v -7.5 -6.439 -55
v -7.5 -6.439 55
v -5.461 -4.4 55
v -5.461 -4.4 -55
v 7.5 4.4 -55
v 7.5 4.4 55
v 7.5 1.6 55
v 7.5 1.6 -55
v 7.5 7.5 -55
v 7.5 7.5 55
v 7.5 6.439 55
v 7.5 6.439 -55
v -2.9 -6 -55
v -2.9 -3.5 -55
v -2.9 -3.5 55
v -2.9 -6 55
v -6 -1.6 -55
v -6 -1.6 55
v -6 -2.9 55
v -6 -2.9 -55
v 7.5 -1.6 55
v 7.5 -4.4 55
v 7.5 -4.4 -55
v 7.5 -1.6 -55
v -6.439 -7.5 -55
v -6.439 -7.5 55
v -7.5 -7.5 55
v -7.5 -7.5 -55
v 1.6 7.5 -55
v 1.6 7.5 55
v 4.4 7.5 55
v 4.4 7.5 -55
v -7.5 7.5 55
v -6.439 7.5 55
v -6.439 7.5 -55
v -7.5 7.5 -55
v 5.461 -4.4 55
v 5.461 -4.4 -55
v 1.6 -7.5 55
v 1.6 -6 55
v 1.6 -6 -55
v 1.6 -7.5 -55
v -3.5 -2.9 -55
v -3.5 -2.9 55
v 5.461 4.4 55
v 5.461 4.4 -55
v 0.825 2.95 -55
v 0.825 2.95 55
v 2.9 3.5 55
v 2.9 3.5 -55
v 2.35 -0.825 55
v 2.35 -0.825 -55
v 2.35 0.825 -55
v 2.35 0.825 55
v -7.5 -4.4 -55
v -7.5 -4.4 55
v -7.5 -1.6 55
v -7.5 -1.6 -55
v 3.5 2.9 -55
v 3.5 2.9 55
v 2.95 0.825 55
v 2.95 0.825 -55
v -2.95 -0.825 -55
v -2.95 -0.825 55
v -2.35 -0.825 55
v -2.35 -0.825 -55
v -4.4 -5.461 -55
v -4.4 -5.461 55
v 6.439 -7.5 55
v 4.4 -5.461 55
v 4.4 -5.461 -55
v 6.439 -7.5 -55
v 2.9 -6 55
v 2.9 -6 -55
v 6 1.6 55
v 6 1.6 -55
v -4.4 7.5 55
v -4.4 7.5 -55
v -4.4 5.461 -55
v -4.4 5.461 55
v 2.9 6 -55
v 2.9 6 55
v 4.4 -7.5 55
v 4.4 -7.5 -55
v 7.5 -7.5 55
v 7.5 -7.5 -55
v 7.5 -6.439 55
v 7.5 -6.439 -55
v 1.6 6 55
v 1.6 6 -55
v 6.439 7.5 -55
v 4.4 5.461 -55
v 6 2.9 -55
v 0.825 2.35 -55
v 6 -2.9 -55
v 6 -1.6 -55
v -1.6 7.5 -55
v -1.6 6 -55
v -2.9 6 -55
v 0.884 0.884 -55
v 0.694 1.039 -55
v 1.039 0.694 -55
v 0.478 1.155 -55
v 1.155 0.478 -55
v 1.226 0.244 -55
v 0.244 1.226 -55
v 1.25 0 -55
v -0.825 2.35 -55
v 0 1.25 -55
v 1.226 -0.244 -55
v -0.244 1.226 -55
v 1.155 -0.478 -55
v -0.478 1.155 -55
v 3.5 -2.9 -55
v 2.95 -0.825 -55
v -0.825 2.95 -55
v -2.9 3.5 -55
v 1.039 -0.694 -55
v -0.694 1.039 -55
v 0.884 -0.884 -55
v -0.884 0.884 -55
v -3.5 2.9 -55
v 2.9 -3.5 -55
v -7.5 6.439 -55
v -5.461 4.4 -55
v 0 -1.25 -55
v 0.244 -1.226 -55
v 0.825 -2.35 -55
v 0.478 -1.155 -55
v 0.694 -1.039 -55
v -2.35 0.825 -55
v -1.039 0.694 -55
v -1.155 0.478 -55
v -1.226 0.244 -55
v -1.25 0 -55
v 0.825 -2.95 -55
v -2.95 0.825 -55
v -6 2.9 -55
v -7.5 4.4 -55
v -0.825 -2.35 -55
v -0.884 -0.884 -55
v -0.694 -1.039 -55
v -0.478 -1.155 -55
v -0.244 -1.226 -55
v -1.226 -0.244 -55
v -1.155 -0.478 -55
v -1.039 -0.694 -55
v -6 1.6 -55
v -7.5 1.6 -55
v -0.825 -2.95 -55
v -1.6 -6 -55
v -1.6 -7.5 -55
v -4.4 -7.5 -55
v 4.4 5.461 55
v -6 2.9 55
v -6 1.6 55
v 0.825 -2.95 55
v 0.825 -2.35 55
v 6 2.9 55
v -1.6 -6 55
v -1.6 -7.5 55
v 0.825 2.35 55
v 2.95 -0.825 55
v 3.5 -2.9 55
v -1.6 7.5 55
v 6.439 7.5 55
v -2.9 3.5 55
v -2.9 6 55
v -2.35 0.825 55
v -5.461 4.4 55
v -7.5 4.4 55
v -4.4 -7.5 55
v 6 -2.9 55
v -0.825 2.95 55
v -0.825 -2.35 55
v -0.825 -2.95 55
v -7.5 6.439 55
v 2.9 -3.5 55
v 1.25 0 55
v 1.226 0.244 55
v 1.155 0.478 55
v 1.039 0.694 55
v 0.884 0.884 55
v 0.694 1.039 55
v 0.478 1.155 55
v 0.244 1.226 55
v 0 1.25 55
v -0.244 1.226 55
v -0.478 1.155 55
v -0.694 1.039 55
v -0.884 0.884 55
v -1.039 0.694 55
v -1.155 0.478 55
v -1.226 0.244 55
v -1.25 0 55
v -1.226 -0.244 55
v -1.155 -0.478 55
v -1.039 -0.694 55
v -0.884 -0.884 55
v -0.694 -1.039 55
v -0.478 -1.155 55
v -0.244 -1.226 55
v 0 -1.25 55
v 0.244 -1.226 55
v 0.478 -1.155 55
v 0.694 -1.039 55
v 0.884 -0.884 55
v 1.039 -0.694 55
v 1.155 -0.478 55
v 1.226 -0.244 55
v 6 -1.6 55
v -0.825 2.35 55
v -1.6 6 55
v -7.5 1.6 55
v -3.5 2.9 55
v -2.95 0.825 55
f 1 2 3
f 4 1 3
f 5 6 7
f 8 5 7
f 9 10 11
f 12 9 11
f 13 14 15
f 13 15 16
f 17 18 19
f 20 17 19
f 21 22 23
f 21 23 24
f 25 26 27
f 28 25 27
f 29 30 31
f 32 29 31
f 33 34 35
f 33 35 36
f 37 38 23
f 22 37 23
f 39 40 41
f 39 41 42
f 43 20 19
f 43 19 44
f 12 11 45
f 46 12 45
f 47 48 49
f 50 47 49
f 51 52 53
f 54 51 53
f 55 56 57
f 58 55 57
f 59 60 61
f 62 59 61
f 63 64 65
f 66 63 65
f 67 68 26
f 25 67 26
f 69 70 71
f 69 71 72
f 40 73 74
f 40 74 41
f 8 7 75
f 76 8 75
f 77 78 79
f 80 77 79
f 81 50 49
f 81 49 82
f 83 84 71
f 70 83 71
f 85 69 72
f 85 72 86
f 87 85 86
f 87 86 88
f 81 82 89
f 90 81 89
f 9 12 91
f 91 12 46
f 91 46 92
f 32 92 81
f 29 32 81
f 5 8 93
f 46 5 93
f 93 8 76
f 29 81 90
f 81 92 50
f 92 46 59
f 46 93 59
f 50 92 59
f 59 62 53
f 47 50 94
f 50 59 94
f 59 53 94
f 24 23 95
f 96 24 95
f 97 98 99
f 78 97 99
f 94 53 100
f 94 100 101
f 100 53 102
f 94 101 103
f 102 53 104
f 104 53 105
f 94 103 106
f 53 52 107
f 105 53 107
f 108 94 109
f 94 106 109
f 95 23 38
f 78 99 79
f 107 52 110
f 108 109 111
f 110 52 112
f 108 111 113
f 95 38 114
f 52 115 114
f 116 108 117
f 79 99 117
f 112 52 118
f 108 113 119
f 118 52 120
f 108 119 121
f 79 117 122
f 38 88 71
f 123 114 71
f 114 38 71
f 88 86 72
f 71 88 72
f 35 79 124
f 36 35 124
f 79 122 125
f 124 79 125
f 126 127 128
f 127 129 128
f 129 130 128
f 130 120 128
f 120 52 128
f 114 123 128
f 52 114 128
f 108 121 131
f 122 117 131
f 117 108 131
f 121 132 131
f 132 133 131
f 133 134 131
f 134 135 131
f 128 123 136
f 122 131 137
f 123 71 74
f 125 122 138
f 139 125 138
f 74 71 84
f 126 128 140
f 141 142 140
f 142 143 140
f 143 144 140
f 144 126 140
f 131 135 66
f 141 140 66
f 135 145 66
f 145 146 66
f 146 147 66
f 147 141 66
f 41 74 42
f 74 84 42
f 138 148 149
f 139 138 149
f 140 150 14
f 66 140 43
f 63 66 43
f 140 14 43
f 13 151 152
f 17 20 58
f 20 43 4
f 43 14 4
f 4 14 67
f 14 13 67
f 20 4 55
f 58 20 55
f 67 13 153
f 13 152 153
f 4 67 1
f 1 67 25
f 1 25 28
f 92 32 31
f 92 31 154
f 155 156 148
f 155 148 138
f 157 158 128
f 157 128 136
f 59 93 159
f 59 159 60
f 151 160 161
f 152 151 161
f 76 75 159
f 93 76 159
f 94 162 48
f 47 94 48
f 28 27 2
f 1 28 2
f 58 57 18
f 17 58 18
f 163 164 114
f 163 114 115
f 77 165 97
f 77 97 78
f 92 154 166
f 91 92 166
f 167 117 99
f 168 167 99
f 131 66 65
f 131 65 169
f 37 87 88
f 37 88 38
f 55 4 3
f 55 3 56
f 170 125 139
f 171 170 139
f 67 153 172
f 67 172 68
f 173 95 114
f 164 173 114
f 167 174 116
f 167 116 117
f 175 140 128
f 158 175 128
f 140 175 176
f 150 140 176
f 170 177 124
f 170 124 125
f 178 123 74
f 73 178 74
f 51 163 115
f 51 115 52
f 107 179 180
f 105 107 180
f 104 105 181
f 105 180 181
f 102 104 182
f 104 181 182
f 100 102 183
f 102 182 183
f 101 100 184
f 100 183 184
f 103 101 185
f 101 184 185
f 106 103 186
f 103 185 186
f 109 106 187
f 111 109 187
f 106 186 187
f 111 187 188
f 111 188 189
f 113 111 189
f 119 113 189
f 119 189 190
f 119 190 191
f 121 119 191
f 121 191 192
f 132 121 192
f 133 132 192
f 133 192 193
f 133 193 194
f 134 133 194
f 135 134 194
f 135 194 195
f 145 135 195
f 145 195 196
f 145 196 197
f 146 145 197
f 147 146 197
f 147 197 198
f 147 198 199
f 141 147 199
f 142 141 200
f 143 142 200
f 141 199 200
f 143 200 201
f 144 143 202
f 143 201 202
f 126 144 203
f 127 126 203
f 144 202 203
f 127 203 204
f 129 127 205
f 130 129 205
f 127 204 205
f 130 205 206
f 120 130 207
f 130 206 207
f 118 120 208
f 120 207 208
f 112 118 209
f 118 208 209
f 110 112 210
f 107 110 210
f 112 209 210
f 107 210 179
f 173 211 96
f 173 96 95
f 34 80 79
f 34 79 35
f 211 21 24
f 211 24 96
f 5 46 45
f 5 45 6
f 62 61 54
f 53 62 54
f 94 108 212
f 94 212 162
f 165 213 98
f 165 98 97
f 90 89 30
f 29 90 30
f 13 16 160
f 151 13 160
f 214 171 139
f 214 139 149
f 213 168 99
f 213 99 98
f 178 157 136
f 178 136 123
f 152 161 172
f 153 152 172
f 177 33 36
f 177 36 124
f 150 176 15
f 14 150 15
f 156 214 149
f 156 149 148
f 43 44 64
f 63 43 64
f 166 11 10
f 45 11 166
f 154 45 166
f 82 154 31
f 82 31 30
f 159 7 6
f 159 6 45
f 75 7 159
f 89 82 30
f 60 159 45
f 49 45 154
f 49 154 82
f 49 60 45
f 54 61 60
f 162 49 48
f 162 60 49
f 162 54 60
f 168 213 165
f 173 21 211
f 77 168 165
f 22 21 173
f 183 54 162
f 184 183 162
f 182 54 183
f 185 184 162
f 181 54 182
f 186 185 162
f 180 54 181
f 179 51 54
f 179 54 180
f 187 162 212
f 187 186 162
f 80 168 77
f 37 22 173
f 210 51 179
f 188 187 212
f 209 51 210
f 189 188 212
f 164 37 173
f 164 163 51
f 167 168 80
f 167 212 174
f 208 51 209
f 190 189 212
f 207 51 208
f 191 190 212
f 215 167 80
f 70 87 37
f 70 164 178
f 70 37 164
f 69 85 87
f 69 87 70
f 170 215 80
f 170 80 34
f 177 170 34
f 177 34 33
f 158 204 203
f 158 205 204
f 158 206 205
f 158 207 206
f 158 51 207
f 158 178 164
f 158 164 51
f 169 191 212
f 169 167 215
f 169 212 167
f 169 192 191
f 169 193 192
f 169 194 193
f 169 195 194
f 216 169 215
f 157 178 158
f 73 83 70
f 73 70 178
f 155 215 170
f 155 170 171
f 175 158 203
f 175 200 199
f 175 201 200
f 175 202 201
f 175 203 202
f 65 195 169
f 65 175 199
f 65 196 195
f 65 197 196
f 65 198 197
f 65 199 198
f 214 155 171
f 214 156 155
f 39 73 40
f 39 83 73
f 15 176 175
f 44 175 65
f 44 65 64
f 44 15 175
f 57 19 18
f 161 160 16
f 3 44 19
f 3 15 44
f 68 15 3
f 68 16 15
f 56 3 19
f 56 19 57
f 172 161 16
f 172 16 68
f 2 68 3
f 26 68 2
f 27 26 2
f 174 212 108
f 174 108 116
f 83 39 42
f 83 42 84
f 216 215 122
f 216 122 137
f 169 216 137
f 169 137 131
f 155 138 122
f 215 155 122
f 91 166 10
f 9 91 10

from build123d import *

# Parameters (mm, degrees)
RESSALTO_EXTRUS_O1_DEPTH   = 55
ESPELHAR2_COPY_1_DEPTH     = 55
ESBO_O2_R                  = 1.25
CORTE_EXTRUS_O1_DEPTH      = 1
CORTE_EXTRUS_O1_DEPTH_BACK = 111


with BuildPart() as part:
    # Esboço1 → Ressalto-extrusão1 (new body, symmetric)
    with BuildSketch(Plane.XY):
        Polygon((0, 2.35), (-0.825, 2.35), (-0.825, 2.95), (-2.9, 3.5), (-2.9, 6), (-1.6, 6), (-1.6, 7.5), (-4.4, 7.5), (-4.4, 5.460660172), (-6.439339828, 7.5), (-7.5, 7.5), (-7.5, 6.439339828), (-5.460660172, 4.4), (-7.5, 4.4), (-7.5, 1.6), (-6, 1.6), (-6, 2.9), (-3.5, 2.9), (-2.95, 0.825), (-2.35, 0.825), (-2.35, 0), (0, 0), align=None)
    ressalto_extrus_o1 = extrude(amount=RESSALTO_EXTRUS_O1_DEPTH, both=True)

    # Espelhar1: Ressalto-extrusão1 across plane
    add(ressalto_extrus_o1.mirror(Plane.ZX))

    # Espelhar2: Ressalto-extrusão1 across plane
    add(ressalto_extrus_o1.mirror(Plane(origin=(0, 0, 0), x_dir=(0, 0, 1), z_dir=(1, 0, 0))))

    # Espelhar2 copy 1 sketch → Espelhar2 copy 1 (add, symmetric)
    with BuildSketch(Plane(origin=(0, 0, 0), x_dir=(-1, 0, 0), z_dir=(0, 0, 1))):
        Polygon((0, 2.35), (-0.825, 2.35), (-0.825, 2.95), (-2.9, 3.5), (-2.9, 6), (-1.6, 6), (-1.6, 7.5), (-4.4, 7.5), (-4.4, 5.460660172), (-6.439339828, 7.5), (-7.5, 7.5), (-7.5, 6.439339828), (-5.460660172, 4.4), (-7.5, 4.4), (-7.5, 1.6), (-6, 1.6), (-6, 2.9), (-3.5, 2.9), (-2.95, 0.825), (-2.35, 0.825), (-2.35, 0), (0, 0), align=None)
    extrude(amount=ESPELHAR2_COPY_1_DEPTH, both=True)

    # Esboço2 → Corte-extrusão1 (cut, two sides)
    with BuildSketch(Plane.XY.offset(55)) as corte_extrus_o1_sk:
        Circle(ESBO_O2_R)
    extrude(amount=CORTE_EXTRUS_O1_DEPTH, mode=Mode.SUBTRACT)
    extrude(corte_extrus_o1_sk.sketch, amount=-CORTE_EXTRUS_O1_DEPTH_BACK, mode=Mode.SUBTRACT)


solid = part.part
